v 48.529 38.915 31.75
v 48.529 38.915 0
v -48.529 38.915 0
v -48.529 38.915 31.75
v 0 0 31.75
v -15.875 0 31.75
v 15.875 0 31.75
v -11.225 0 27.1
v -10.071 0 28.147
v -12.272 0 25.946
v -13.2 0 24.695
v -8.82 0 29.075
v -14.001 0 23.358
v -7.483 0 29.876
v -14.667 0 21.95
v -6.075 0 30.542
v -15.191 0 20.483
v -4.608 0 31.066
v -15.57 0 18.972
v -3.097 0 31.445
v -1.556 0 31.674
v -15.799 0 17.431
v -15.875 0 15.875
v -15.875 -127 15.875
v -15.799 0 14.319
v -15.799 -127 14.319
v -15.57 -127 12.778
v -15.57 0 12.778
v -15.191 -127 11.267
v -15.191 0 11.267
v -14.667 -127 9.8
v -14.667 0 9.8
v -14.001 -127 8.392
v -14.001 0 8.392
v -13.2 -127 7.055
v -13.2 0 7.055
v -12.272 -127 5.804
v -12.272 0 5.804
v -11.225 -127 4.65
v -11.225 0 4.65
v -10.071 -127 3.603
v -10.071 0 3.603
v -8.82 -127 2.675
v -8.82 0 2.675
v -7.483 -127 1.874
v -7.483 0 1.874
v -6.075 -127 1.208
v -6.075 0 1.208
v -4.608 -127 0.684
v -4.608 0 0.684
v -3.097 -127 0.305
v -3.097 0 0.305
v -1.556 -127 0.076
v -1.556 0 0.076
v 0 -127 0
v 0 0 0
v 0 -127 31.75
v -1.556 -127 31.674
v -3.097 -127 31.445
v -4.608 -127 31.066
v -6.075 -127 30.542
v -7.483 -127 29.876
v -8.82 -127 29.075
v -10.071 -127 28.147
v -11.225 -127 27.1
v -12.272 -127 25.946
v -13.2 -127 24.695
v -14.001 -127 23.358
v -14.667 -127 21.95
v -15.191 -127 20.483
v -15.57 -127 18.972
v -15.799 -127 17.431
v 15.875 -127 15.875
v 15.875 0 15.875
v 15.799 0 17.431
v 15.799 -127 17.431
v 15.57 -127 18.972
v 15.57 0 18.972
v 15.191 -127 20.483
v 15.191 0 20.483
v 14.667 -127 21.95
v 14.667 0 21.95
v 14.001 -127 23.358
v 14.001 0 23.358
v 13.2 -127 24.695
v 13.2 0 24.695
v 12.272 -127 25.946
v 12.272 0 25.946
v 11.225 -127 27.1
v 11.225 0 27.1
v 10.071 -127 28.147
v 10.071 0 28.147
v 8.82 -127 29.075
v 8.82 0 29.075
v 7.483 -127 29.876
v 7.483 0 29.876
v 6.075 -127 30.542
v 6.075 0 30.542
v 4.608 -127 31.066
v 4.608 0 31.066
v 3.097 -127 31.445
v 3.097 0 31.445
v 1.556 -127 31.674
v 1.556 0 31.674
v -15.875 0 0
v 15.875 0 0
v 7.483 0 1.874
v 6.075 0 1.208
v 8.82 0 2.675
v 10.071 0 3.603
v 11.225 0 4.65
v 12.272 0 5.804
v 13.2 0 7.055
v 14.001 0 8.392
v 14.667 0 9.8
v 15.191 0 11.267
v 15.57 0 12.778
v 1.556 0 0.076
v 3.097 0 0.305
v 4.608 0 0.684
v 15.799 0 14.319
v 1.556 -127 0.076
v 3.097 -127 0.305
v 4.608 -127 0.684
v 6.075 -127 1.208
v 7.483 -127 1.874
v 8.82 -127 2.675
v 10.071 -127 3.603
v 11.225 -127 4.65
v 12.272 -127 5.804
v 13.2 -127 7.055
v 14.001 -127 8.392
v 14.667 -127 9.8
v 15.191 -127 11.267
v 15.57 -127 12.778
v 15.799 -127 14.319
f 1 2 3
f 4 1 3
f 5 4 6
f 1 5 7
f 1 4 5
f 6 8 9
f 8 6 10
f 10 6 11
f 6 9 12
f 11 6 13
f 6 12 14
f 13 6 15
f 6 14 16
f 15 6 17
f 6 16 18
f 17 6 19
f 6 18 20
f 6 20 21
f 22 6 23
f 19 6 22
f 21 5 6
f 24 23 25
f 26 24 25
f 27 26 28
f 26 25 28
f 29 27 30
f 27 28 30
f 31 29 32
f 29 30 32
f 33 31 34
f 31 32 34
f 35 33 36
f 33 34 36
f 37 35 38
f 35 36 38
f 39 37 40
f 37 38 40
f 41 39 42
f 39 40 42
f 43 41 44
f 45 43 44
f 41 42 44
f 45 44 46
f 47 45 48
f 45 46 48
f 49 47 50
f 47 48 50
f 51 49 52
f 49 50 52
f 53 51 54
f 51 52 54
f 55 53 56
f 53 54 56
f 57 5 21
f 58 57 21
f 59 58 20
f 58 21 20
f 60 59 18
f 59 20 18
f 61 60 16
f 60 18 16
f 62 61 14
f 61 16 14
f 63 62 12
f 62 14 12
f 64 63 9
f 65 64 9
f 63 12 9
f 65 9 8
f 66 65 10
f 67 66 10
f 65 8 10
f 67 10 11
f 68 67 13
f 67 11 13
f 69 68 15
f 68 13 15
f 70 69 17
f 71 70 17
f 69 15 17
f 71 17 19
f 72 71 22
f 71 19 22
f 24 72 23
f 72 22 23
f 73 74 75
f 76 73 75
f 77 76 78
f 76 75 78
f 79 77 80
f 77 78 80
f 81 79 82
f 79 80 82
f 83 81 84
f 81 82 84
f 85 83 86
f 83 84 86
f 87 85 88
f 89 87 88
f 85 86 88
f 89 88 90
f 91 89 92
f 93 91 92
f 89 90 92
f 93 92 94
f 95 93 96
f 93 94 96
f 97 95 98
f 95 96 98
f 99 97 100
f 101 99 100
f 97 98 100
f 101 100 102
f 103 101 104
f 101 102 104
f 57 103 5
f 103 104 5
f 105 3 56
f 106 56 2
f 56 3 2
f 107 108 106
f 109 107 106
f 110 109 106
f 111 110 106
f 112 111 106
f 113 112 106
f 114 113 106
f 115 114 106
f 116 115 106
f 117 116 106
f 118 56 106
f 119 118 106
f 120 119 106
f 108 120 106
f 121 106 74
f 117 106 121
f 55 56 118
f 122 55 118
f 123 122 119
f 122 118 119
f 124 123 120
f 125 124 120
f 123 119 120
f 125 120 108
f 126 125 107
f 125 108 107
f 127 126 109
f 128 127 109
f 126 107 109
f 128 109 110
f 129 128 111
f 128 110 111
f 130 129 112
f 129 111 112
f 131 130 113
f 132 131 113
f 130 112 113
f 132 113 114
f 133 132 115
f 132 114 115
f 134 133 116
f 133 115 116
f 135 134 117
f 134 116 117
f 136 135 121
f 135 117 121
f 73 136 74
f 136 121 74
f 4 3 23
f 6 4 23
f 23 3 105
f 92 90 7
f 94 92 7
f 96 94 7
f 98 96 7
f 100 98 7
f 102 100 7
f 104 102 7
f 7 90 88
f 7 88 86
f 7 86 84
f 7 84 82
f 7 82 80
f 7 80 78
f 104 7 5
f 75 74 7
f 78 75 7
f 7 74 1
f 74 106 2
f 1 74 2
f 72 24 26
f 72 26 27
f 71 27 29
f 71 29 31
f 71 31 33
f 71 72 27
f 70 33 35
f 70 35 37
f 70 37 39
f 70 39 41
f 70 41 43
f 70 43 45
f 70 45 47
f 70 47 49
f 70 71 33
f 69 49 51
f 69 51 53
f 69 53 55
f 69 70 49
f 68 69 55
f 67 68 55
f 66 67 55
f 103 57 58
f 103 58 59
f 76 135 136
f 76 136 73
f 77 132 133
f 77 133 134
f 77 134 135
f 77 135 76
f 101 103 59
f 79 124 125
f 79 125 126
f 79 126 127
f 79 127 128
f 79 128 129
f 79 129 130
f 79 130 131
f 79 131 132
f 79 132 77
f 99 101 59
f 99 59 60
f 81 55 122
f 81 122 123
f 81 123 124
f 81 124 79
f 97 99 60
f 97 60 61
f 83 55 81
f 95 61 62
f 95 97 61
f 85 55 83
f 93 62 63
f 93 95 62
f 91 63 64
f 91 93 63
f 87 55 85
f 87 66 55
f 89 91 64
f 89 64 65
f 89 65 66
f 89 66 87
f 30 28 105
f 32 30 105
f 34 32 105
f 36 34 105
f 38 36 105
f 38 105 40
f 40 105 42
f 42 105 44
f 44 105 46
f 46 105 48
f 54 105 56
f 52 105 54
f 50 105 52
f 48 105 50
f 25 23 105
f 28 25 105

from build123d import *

# Parameters (mm, degrees)
F1_DEPTH = 31.75
F3_DEPTH = 127


# Not quite as in the source:
# - a feature names something its author has since deleted; it is built from what else it names


with BuildPart() as f1:
    # F0 (on Top) → F1 (new body)
    with BuildSketch(Plane.XY):
        Polygon((-48.5286105721, 38.9150577104), (-15.875, 0), (15.875, 0), (48.5286105721, 38.9150577104), align=None)
    extrude(amount=F1_DEPTH)

    # F2 (on face) → F3 (join)
    with BuildSketch(Plane.XZ):
        with BuildLine():
            ThreePointArc((5.44e-08, 0), (11.2253201706, 4.6496798679), (15.875, 15.875))
            ThreePointArc((15.875, 15.875), (11.2253201513, 27.1003201513), (0, 31.75))
            ThreePointArc((0, 31.75), (-11.2253201513, 27.1003201513), (-15.875, 15.875))
            ThreePointArc((-15.875, 15.875), (-11.2253201321, 4.6496798294), (5.44e-08, 0))
        make_face()
    extrude(amount=F3_DEPTH)


solid = f1.part
